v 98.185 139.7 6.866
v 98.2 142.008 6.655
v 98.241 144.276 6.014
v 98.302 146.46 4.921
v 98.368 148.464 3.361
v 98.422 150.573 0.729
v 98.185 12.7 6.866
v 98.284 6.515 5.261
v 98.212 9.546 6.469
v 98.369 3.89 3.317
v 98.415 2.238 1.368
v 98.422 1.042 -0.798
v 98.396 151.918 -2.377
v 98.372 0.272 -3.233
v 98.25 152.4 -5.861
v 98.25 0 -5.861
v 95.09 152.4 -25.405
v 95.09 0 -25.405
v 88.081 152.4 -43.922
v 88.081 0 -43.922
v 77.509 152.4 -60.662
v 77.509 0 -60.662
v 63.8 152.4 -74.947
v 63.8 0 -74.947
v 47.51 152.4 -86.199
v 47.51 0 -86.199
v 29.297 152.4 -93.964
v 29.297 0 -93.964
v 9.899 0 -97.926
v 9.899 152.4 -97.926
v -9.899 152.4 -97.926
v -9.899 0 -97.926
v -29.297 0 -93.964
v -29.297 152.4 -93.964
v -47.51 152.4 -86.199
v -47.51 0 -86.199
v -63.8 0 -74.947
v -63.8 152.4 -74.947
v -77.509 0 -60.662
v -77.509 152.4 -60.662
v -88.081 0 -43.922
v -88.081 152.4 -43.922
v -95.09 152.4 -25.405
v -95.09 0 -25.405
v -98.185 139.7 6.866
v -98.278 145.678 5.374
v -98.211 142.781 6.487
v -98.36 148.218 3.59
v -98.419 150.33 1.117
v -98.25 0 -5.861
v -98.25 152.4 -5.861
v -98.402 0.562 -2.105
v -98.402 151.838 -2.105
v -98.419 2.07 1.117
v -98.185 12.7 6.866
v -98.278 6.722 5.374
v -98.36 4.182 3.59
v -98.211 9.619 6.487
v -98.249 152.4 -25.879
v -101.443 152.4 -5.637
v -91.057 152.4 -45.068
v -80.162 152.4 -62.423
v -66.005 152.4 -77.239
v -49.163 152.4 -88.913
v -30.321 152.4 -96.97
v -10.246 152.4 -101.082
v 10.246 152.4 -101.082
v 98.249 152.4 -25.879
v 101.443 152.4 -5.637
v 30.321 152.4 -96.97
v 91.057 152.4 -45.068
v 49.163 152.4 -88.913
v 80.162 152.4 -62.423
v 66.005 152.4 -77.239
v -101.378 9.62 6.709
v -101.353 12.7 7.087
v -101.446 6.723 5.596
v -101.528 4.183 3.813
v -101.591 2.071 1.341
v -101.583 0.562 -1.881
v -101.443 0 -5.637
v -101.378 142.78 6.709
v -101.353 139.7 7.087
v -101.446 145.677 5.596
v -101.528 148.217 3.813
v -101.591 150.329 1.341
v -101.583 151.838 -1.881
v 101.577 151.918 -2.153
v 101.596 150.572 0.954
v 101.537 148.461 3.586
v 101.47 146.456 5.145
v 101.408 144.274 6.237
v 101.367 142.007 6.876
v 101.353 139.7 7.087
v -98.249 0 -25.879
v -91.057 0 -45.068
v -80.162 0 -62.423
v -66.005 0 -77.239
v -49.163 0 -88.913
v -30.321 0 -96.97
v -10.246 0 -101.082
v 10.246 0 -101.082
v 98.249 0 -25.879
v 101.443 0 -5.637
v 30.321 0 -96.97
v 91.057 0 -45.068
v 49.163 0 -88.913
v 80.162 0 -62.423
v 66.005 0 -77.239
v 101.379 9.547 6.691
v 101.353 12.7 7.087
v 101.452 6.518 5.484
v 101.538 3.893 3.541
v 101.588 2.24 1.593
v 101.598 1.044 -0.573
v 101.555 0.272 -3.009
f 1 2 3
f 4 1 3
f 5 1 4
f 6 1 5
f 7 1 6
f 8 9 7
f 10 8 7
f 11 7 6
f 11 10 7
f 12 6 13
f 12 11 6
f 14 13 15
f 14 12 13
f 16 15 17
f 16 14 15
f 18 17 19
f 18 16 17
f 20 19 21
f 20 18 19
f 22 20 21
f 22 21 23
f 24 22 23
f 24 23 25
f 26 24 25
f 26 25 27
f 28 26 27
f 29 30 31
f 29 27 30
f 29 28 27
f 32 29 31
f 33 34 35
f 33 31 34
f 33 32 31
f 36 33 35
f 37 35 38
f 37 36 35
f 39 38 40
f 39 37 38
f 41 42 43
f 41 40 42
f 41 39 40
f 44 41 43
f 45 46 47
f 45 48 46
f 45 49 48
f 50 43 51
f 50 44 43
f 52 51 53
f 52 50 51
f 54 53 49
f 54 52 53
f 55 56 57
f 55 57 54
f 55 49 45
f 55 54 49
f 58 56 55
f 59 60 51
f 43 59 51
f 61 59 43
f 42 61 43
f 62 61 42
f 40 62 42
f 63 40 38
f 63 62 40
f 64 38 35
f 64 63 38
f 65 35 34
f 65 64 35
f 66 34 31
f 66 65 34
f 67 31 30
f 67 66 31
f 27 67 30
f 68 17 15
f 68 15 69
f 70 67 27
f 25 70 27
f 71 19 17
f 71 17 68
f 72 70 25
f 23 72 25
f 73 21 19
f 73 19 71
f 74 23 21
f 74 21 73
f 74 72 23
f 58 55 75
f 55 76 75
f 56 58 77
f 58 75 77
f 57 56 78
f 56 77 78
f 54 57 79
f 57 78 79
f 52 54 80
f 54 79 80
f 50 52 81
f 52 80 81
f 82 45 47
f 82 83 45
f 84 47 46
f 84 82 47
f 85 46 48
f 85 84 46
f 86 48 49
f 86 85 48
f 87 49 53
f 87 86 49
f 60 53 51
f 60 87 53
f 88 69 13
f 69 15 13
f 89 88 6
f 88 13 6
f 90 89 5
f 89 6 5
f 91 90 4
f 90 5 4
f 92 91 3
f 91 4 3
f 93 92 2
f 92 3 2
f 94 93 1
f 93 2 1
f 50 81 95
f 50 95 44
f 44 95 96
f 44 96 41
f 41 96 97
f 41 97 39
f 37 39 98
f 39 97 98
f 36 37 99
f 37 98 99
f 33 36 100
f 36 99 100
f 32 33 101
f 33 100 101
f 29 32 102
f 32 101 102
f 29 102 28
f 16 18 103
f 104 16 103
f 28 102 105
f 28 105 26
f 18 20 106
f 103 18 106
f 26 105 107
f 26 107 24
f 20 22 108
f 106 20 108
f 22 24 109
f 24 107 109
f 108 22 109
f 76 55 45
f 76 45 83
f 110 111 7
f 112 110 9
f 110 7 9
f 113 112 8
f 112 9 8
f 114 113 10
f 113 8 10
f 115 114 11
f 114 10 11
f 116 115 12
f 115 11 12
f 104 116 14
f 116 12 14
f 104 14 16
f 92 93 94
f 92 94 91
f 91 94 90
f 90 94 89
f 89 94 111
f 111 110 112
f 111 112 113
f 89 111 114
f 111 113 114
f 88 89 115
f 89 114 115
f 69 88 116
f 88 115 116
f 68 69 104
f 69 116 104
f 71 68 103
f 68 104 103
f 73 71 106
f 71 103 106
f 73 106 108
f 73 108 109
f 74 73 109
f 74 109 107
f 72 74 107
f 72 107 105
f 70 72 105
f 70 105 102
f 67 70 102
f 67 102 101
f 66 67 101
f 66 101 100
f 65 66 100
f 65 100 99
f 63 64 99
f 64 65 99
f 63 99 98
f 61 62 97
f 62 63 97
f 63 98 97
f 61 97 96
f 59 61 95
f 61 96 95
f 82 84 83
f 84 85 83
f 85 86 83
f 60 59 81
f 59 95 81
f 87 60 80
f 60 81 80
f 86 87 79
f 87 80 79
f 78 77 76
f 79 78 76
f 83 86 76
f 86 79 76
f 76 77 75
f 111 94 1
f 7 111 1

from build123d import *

# Parameters (mm, degrees)
SKETCH1_R           = 101.6
SKETCH1_R_2         = 98.425
BOSS_EXTRUDE1_DEPTH = 152.4
CUT_EXTRUDE1_DEPTH  = 152.4
FILLET1_R           = 12.7


with BuildPart() as part:
    # Sketch1 → Boss-Extrude1 (new body)
    with BuildSketch(Plane(origin=(0, 0, 0), x_dir=(1, 0, 0), z_dir=(0, 1, 0))):
        Circle(SKETCH1_R)
        Circle(SKETCH1_R_2, mode=Mode.SUBTRACT)
    extrude(amount=BOSS_EXTRUDE1_DEPTH)

    # Sketch2 → Cut-Extrude1 (cut)
    with BuildSketch(Plane(origin=(0, 0, 0), x_dir=(1, 0, 0), z_dir=(0, 1, 0))):
        Polygon((570.652570484, -39.903914981), (101.352507506, -7.087257732), (0, 0), (-101.352507506, -7.087257732), (-570.652570484, -39.903914981), (-570.652570484, -980.796006784), (570.652570484, -980.796006784), align=None)
    extrude(amount=CUT_EXTRUDE1_DEPTH, mode=Mode.SUBTRACT)

    # Fillet1
    fillet1_edges = [part.edges().sort_by_distance(p)[0] for p in [
        (-99.768874577, 0, 6.97651933),
        (99.768874577, 152.4, 6.97651933),
        (-99.768874577, 152.4, 6.97651933),
        (99.768874577, 0, 6.97651933),
    ]]
    fillet(fillet1_edges, radius=FILLET1_R)


solid = part.part
